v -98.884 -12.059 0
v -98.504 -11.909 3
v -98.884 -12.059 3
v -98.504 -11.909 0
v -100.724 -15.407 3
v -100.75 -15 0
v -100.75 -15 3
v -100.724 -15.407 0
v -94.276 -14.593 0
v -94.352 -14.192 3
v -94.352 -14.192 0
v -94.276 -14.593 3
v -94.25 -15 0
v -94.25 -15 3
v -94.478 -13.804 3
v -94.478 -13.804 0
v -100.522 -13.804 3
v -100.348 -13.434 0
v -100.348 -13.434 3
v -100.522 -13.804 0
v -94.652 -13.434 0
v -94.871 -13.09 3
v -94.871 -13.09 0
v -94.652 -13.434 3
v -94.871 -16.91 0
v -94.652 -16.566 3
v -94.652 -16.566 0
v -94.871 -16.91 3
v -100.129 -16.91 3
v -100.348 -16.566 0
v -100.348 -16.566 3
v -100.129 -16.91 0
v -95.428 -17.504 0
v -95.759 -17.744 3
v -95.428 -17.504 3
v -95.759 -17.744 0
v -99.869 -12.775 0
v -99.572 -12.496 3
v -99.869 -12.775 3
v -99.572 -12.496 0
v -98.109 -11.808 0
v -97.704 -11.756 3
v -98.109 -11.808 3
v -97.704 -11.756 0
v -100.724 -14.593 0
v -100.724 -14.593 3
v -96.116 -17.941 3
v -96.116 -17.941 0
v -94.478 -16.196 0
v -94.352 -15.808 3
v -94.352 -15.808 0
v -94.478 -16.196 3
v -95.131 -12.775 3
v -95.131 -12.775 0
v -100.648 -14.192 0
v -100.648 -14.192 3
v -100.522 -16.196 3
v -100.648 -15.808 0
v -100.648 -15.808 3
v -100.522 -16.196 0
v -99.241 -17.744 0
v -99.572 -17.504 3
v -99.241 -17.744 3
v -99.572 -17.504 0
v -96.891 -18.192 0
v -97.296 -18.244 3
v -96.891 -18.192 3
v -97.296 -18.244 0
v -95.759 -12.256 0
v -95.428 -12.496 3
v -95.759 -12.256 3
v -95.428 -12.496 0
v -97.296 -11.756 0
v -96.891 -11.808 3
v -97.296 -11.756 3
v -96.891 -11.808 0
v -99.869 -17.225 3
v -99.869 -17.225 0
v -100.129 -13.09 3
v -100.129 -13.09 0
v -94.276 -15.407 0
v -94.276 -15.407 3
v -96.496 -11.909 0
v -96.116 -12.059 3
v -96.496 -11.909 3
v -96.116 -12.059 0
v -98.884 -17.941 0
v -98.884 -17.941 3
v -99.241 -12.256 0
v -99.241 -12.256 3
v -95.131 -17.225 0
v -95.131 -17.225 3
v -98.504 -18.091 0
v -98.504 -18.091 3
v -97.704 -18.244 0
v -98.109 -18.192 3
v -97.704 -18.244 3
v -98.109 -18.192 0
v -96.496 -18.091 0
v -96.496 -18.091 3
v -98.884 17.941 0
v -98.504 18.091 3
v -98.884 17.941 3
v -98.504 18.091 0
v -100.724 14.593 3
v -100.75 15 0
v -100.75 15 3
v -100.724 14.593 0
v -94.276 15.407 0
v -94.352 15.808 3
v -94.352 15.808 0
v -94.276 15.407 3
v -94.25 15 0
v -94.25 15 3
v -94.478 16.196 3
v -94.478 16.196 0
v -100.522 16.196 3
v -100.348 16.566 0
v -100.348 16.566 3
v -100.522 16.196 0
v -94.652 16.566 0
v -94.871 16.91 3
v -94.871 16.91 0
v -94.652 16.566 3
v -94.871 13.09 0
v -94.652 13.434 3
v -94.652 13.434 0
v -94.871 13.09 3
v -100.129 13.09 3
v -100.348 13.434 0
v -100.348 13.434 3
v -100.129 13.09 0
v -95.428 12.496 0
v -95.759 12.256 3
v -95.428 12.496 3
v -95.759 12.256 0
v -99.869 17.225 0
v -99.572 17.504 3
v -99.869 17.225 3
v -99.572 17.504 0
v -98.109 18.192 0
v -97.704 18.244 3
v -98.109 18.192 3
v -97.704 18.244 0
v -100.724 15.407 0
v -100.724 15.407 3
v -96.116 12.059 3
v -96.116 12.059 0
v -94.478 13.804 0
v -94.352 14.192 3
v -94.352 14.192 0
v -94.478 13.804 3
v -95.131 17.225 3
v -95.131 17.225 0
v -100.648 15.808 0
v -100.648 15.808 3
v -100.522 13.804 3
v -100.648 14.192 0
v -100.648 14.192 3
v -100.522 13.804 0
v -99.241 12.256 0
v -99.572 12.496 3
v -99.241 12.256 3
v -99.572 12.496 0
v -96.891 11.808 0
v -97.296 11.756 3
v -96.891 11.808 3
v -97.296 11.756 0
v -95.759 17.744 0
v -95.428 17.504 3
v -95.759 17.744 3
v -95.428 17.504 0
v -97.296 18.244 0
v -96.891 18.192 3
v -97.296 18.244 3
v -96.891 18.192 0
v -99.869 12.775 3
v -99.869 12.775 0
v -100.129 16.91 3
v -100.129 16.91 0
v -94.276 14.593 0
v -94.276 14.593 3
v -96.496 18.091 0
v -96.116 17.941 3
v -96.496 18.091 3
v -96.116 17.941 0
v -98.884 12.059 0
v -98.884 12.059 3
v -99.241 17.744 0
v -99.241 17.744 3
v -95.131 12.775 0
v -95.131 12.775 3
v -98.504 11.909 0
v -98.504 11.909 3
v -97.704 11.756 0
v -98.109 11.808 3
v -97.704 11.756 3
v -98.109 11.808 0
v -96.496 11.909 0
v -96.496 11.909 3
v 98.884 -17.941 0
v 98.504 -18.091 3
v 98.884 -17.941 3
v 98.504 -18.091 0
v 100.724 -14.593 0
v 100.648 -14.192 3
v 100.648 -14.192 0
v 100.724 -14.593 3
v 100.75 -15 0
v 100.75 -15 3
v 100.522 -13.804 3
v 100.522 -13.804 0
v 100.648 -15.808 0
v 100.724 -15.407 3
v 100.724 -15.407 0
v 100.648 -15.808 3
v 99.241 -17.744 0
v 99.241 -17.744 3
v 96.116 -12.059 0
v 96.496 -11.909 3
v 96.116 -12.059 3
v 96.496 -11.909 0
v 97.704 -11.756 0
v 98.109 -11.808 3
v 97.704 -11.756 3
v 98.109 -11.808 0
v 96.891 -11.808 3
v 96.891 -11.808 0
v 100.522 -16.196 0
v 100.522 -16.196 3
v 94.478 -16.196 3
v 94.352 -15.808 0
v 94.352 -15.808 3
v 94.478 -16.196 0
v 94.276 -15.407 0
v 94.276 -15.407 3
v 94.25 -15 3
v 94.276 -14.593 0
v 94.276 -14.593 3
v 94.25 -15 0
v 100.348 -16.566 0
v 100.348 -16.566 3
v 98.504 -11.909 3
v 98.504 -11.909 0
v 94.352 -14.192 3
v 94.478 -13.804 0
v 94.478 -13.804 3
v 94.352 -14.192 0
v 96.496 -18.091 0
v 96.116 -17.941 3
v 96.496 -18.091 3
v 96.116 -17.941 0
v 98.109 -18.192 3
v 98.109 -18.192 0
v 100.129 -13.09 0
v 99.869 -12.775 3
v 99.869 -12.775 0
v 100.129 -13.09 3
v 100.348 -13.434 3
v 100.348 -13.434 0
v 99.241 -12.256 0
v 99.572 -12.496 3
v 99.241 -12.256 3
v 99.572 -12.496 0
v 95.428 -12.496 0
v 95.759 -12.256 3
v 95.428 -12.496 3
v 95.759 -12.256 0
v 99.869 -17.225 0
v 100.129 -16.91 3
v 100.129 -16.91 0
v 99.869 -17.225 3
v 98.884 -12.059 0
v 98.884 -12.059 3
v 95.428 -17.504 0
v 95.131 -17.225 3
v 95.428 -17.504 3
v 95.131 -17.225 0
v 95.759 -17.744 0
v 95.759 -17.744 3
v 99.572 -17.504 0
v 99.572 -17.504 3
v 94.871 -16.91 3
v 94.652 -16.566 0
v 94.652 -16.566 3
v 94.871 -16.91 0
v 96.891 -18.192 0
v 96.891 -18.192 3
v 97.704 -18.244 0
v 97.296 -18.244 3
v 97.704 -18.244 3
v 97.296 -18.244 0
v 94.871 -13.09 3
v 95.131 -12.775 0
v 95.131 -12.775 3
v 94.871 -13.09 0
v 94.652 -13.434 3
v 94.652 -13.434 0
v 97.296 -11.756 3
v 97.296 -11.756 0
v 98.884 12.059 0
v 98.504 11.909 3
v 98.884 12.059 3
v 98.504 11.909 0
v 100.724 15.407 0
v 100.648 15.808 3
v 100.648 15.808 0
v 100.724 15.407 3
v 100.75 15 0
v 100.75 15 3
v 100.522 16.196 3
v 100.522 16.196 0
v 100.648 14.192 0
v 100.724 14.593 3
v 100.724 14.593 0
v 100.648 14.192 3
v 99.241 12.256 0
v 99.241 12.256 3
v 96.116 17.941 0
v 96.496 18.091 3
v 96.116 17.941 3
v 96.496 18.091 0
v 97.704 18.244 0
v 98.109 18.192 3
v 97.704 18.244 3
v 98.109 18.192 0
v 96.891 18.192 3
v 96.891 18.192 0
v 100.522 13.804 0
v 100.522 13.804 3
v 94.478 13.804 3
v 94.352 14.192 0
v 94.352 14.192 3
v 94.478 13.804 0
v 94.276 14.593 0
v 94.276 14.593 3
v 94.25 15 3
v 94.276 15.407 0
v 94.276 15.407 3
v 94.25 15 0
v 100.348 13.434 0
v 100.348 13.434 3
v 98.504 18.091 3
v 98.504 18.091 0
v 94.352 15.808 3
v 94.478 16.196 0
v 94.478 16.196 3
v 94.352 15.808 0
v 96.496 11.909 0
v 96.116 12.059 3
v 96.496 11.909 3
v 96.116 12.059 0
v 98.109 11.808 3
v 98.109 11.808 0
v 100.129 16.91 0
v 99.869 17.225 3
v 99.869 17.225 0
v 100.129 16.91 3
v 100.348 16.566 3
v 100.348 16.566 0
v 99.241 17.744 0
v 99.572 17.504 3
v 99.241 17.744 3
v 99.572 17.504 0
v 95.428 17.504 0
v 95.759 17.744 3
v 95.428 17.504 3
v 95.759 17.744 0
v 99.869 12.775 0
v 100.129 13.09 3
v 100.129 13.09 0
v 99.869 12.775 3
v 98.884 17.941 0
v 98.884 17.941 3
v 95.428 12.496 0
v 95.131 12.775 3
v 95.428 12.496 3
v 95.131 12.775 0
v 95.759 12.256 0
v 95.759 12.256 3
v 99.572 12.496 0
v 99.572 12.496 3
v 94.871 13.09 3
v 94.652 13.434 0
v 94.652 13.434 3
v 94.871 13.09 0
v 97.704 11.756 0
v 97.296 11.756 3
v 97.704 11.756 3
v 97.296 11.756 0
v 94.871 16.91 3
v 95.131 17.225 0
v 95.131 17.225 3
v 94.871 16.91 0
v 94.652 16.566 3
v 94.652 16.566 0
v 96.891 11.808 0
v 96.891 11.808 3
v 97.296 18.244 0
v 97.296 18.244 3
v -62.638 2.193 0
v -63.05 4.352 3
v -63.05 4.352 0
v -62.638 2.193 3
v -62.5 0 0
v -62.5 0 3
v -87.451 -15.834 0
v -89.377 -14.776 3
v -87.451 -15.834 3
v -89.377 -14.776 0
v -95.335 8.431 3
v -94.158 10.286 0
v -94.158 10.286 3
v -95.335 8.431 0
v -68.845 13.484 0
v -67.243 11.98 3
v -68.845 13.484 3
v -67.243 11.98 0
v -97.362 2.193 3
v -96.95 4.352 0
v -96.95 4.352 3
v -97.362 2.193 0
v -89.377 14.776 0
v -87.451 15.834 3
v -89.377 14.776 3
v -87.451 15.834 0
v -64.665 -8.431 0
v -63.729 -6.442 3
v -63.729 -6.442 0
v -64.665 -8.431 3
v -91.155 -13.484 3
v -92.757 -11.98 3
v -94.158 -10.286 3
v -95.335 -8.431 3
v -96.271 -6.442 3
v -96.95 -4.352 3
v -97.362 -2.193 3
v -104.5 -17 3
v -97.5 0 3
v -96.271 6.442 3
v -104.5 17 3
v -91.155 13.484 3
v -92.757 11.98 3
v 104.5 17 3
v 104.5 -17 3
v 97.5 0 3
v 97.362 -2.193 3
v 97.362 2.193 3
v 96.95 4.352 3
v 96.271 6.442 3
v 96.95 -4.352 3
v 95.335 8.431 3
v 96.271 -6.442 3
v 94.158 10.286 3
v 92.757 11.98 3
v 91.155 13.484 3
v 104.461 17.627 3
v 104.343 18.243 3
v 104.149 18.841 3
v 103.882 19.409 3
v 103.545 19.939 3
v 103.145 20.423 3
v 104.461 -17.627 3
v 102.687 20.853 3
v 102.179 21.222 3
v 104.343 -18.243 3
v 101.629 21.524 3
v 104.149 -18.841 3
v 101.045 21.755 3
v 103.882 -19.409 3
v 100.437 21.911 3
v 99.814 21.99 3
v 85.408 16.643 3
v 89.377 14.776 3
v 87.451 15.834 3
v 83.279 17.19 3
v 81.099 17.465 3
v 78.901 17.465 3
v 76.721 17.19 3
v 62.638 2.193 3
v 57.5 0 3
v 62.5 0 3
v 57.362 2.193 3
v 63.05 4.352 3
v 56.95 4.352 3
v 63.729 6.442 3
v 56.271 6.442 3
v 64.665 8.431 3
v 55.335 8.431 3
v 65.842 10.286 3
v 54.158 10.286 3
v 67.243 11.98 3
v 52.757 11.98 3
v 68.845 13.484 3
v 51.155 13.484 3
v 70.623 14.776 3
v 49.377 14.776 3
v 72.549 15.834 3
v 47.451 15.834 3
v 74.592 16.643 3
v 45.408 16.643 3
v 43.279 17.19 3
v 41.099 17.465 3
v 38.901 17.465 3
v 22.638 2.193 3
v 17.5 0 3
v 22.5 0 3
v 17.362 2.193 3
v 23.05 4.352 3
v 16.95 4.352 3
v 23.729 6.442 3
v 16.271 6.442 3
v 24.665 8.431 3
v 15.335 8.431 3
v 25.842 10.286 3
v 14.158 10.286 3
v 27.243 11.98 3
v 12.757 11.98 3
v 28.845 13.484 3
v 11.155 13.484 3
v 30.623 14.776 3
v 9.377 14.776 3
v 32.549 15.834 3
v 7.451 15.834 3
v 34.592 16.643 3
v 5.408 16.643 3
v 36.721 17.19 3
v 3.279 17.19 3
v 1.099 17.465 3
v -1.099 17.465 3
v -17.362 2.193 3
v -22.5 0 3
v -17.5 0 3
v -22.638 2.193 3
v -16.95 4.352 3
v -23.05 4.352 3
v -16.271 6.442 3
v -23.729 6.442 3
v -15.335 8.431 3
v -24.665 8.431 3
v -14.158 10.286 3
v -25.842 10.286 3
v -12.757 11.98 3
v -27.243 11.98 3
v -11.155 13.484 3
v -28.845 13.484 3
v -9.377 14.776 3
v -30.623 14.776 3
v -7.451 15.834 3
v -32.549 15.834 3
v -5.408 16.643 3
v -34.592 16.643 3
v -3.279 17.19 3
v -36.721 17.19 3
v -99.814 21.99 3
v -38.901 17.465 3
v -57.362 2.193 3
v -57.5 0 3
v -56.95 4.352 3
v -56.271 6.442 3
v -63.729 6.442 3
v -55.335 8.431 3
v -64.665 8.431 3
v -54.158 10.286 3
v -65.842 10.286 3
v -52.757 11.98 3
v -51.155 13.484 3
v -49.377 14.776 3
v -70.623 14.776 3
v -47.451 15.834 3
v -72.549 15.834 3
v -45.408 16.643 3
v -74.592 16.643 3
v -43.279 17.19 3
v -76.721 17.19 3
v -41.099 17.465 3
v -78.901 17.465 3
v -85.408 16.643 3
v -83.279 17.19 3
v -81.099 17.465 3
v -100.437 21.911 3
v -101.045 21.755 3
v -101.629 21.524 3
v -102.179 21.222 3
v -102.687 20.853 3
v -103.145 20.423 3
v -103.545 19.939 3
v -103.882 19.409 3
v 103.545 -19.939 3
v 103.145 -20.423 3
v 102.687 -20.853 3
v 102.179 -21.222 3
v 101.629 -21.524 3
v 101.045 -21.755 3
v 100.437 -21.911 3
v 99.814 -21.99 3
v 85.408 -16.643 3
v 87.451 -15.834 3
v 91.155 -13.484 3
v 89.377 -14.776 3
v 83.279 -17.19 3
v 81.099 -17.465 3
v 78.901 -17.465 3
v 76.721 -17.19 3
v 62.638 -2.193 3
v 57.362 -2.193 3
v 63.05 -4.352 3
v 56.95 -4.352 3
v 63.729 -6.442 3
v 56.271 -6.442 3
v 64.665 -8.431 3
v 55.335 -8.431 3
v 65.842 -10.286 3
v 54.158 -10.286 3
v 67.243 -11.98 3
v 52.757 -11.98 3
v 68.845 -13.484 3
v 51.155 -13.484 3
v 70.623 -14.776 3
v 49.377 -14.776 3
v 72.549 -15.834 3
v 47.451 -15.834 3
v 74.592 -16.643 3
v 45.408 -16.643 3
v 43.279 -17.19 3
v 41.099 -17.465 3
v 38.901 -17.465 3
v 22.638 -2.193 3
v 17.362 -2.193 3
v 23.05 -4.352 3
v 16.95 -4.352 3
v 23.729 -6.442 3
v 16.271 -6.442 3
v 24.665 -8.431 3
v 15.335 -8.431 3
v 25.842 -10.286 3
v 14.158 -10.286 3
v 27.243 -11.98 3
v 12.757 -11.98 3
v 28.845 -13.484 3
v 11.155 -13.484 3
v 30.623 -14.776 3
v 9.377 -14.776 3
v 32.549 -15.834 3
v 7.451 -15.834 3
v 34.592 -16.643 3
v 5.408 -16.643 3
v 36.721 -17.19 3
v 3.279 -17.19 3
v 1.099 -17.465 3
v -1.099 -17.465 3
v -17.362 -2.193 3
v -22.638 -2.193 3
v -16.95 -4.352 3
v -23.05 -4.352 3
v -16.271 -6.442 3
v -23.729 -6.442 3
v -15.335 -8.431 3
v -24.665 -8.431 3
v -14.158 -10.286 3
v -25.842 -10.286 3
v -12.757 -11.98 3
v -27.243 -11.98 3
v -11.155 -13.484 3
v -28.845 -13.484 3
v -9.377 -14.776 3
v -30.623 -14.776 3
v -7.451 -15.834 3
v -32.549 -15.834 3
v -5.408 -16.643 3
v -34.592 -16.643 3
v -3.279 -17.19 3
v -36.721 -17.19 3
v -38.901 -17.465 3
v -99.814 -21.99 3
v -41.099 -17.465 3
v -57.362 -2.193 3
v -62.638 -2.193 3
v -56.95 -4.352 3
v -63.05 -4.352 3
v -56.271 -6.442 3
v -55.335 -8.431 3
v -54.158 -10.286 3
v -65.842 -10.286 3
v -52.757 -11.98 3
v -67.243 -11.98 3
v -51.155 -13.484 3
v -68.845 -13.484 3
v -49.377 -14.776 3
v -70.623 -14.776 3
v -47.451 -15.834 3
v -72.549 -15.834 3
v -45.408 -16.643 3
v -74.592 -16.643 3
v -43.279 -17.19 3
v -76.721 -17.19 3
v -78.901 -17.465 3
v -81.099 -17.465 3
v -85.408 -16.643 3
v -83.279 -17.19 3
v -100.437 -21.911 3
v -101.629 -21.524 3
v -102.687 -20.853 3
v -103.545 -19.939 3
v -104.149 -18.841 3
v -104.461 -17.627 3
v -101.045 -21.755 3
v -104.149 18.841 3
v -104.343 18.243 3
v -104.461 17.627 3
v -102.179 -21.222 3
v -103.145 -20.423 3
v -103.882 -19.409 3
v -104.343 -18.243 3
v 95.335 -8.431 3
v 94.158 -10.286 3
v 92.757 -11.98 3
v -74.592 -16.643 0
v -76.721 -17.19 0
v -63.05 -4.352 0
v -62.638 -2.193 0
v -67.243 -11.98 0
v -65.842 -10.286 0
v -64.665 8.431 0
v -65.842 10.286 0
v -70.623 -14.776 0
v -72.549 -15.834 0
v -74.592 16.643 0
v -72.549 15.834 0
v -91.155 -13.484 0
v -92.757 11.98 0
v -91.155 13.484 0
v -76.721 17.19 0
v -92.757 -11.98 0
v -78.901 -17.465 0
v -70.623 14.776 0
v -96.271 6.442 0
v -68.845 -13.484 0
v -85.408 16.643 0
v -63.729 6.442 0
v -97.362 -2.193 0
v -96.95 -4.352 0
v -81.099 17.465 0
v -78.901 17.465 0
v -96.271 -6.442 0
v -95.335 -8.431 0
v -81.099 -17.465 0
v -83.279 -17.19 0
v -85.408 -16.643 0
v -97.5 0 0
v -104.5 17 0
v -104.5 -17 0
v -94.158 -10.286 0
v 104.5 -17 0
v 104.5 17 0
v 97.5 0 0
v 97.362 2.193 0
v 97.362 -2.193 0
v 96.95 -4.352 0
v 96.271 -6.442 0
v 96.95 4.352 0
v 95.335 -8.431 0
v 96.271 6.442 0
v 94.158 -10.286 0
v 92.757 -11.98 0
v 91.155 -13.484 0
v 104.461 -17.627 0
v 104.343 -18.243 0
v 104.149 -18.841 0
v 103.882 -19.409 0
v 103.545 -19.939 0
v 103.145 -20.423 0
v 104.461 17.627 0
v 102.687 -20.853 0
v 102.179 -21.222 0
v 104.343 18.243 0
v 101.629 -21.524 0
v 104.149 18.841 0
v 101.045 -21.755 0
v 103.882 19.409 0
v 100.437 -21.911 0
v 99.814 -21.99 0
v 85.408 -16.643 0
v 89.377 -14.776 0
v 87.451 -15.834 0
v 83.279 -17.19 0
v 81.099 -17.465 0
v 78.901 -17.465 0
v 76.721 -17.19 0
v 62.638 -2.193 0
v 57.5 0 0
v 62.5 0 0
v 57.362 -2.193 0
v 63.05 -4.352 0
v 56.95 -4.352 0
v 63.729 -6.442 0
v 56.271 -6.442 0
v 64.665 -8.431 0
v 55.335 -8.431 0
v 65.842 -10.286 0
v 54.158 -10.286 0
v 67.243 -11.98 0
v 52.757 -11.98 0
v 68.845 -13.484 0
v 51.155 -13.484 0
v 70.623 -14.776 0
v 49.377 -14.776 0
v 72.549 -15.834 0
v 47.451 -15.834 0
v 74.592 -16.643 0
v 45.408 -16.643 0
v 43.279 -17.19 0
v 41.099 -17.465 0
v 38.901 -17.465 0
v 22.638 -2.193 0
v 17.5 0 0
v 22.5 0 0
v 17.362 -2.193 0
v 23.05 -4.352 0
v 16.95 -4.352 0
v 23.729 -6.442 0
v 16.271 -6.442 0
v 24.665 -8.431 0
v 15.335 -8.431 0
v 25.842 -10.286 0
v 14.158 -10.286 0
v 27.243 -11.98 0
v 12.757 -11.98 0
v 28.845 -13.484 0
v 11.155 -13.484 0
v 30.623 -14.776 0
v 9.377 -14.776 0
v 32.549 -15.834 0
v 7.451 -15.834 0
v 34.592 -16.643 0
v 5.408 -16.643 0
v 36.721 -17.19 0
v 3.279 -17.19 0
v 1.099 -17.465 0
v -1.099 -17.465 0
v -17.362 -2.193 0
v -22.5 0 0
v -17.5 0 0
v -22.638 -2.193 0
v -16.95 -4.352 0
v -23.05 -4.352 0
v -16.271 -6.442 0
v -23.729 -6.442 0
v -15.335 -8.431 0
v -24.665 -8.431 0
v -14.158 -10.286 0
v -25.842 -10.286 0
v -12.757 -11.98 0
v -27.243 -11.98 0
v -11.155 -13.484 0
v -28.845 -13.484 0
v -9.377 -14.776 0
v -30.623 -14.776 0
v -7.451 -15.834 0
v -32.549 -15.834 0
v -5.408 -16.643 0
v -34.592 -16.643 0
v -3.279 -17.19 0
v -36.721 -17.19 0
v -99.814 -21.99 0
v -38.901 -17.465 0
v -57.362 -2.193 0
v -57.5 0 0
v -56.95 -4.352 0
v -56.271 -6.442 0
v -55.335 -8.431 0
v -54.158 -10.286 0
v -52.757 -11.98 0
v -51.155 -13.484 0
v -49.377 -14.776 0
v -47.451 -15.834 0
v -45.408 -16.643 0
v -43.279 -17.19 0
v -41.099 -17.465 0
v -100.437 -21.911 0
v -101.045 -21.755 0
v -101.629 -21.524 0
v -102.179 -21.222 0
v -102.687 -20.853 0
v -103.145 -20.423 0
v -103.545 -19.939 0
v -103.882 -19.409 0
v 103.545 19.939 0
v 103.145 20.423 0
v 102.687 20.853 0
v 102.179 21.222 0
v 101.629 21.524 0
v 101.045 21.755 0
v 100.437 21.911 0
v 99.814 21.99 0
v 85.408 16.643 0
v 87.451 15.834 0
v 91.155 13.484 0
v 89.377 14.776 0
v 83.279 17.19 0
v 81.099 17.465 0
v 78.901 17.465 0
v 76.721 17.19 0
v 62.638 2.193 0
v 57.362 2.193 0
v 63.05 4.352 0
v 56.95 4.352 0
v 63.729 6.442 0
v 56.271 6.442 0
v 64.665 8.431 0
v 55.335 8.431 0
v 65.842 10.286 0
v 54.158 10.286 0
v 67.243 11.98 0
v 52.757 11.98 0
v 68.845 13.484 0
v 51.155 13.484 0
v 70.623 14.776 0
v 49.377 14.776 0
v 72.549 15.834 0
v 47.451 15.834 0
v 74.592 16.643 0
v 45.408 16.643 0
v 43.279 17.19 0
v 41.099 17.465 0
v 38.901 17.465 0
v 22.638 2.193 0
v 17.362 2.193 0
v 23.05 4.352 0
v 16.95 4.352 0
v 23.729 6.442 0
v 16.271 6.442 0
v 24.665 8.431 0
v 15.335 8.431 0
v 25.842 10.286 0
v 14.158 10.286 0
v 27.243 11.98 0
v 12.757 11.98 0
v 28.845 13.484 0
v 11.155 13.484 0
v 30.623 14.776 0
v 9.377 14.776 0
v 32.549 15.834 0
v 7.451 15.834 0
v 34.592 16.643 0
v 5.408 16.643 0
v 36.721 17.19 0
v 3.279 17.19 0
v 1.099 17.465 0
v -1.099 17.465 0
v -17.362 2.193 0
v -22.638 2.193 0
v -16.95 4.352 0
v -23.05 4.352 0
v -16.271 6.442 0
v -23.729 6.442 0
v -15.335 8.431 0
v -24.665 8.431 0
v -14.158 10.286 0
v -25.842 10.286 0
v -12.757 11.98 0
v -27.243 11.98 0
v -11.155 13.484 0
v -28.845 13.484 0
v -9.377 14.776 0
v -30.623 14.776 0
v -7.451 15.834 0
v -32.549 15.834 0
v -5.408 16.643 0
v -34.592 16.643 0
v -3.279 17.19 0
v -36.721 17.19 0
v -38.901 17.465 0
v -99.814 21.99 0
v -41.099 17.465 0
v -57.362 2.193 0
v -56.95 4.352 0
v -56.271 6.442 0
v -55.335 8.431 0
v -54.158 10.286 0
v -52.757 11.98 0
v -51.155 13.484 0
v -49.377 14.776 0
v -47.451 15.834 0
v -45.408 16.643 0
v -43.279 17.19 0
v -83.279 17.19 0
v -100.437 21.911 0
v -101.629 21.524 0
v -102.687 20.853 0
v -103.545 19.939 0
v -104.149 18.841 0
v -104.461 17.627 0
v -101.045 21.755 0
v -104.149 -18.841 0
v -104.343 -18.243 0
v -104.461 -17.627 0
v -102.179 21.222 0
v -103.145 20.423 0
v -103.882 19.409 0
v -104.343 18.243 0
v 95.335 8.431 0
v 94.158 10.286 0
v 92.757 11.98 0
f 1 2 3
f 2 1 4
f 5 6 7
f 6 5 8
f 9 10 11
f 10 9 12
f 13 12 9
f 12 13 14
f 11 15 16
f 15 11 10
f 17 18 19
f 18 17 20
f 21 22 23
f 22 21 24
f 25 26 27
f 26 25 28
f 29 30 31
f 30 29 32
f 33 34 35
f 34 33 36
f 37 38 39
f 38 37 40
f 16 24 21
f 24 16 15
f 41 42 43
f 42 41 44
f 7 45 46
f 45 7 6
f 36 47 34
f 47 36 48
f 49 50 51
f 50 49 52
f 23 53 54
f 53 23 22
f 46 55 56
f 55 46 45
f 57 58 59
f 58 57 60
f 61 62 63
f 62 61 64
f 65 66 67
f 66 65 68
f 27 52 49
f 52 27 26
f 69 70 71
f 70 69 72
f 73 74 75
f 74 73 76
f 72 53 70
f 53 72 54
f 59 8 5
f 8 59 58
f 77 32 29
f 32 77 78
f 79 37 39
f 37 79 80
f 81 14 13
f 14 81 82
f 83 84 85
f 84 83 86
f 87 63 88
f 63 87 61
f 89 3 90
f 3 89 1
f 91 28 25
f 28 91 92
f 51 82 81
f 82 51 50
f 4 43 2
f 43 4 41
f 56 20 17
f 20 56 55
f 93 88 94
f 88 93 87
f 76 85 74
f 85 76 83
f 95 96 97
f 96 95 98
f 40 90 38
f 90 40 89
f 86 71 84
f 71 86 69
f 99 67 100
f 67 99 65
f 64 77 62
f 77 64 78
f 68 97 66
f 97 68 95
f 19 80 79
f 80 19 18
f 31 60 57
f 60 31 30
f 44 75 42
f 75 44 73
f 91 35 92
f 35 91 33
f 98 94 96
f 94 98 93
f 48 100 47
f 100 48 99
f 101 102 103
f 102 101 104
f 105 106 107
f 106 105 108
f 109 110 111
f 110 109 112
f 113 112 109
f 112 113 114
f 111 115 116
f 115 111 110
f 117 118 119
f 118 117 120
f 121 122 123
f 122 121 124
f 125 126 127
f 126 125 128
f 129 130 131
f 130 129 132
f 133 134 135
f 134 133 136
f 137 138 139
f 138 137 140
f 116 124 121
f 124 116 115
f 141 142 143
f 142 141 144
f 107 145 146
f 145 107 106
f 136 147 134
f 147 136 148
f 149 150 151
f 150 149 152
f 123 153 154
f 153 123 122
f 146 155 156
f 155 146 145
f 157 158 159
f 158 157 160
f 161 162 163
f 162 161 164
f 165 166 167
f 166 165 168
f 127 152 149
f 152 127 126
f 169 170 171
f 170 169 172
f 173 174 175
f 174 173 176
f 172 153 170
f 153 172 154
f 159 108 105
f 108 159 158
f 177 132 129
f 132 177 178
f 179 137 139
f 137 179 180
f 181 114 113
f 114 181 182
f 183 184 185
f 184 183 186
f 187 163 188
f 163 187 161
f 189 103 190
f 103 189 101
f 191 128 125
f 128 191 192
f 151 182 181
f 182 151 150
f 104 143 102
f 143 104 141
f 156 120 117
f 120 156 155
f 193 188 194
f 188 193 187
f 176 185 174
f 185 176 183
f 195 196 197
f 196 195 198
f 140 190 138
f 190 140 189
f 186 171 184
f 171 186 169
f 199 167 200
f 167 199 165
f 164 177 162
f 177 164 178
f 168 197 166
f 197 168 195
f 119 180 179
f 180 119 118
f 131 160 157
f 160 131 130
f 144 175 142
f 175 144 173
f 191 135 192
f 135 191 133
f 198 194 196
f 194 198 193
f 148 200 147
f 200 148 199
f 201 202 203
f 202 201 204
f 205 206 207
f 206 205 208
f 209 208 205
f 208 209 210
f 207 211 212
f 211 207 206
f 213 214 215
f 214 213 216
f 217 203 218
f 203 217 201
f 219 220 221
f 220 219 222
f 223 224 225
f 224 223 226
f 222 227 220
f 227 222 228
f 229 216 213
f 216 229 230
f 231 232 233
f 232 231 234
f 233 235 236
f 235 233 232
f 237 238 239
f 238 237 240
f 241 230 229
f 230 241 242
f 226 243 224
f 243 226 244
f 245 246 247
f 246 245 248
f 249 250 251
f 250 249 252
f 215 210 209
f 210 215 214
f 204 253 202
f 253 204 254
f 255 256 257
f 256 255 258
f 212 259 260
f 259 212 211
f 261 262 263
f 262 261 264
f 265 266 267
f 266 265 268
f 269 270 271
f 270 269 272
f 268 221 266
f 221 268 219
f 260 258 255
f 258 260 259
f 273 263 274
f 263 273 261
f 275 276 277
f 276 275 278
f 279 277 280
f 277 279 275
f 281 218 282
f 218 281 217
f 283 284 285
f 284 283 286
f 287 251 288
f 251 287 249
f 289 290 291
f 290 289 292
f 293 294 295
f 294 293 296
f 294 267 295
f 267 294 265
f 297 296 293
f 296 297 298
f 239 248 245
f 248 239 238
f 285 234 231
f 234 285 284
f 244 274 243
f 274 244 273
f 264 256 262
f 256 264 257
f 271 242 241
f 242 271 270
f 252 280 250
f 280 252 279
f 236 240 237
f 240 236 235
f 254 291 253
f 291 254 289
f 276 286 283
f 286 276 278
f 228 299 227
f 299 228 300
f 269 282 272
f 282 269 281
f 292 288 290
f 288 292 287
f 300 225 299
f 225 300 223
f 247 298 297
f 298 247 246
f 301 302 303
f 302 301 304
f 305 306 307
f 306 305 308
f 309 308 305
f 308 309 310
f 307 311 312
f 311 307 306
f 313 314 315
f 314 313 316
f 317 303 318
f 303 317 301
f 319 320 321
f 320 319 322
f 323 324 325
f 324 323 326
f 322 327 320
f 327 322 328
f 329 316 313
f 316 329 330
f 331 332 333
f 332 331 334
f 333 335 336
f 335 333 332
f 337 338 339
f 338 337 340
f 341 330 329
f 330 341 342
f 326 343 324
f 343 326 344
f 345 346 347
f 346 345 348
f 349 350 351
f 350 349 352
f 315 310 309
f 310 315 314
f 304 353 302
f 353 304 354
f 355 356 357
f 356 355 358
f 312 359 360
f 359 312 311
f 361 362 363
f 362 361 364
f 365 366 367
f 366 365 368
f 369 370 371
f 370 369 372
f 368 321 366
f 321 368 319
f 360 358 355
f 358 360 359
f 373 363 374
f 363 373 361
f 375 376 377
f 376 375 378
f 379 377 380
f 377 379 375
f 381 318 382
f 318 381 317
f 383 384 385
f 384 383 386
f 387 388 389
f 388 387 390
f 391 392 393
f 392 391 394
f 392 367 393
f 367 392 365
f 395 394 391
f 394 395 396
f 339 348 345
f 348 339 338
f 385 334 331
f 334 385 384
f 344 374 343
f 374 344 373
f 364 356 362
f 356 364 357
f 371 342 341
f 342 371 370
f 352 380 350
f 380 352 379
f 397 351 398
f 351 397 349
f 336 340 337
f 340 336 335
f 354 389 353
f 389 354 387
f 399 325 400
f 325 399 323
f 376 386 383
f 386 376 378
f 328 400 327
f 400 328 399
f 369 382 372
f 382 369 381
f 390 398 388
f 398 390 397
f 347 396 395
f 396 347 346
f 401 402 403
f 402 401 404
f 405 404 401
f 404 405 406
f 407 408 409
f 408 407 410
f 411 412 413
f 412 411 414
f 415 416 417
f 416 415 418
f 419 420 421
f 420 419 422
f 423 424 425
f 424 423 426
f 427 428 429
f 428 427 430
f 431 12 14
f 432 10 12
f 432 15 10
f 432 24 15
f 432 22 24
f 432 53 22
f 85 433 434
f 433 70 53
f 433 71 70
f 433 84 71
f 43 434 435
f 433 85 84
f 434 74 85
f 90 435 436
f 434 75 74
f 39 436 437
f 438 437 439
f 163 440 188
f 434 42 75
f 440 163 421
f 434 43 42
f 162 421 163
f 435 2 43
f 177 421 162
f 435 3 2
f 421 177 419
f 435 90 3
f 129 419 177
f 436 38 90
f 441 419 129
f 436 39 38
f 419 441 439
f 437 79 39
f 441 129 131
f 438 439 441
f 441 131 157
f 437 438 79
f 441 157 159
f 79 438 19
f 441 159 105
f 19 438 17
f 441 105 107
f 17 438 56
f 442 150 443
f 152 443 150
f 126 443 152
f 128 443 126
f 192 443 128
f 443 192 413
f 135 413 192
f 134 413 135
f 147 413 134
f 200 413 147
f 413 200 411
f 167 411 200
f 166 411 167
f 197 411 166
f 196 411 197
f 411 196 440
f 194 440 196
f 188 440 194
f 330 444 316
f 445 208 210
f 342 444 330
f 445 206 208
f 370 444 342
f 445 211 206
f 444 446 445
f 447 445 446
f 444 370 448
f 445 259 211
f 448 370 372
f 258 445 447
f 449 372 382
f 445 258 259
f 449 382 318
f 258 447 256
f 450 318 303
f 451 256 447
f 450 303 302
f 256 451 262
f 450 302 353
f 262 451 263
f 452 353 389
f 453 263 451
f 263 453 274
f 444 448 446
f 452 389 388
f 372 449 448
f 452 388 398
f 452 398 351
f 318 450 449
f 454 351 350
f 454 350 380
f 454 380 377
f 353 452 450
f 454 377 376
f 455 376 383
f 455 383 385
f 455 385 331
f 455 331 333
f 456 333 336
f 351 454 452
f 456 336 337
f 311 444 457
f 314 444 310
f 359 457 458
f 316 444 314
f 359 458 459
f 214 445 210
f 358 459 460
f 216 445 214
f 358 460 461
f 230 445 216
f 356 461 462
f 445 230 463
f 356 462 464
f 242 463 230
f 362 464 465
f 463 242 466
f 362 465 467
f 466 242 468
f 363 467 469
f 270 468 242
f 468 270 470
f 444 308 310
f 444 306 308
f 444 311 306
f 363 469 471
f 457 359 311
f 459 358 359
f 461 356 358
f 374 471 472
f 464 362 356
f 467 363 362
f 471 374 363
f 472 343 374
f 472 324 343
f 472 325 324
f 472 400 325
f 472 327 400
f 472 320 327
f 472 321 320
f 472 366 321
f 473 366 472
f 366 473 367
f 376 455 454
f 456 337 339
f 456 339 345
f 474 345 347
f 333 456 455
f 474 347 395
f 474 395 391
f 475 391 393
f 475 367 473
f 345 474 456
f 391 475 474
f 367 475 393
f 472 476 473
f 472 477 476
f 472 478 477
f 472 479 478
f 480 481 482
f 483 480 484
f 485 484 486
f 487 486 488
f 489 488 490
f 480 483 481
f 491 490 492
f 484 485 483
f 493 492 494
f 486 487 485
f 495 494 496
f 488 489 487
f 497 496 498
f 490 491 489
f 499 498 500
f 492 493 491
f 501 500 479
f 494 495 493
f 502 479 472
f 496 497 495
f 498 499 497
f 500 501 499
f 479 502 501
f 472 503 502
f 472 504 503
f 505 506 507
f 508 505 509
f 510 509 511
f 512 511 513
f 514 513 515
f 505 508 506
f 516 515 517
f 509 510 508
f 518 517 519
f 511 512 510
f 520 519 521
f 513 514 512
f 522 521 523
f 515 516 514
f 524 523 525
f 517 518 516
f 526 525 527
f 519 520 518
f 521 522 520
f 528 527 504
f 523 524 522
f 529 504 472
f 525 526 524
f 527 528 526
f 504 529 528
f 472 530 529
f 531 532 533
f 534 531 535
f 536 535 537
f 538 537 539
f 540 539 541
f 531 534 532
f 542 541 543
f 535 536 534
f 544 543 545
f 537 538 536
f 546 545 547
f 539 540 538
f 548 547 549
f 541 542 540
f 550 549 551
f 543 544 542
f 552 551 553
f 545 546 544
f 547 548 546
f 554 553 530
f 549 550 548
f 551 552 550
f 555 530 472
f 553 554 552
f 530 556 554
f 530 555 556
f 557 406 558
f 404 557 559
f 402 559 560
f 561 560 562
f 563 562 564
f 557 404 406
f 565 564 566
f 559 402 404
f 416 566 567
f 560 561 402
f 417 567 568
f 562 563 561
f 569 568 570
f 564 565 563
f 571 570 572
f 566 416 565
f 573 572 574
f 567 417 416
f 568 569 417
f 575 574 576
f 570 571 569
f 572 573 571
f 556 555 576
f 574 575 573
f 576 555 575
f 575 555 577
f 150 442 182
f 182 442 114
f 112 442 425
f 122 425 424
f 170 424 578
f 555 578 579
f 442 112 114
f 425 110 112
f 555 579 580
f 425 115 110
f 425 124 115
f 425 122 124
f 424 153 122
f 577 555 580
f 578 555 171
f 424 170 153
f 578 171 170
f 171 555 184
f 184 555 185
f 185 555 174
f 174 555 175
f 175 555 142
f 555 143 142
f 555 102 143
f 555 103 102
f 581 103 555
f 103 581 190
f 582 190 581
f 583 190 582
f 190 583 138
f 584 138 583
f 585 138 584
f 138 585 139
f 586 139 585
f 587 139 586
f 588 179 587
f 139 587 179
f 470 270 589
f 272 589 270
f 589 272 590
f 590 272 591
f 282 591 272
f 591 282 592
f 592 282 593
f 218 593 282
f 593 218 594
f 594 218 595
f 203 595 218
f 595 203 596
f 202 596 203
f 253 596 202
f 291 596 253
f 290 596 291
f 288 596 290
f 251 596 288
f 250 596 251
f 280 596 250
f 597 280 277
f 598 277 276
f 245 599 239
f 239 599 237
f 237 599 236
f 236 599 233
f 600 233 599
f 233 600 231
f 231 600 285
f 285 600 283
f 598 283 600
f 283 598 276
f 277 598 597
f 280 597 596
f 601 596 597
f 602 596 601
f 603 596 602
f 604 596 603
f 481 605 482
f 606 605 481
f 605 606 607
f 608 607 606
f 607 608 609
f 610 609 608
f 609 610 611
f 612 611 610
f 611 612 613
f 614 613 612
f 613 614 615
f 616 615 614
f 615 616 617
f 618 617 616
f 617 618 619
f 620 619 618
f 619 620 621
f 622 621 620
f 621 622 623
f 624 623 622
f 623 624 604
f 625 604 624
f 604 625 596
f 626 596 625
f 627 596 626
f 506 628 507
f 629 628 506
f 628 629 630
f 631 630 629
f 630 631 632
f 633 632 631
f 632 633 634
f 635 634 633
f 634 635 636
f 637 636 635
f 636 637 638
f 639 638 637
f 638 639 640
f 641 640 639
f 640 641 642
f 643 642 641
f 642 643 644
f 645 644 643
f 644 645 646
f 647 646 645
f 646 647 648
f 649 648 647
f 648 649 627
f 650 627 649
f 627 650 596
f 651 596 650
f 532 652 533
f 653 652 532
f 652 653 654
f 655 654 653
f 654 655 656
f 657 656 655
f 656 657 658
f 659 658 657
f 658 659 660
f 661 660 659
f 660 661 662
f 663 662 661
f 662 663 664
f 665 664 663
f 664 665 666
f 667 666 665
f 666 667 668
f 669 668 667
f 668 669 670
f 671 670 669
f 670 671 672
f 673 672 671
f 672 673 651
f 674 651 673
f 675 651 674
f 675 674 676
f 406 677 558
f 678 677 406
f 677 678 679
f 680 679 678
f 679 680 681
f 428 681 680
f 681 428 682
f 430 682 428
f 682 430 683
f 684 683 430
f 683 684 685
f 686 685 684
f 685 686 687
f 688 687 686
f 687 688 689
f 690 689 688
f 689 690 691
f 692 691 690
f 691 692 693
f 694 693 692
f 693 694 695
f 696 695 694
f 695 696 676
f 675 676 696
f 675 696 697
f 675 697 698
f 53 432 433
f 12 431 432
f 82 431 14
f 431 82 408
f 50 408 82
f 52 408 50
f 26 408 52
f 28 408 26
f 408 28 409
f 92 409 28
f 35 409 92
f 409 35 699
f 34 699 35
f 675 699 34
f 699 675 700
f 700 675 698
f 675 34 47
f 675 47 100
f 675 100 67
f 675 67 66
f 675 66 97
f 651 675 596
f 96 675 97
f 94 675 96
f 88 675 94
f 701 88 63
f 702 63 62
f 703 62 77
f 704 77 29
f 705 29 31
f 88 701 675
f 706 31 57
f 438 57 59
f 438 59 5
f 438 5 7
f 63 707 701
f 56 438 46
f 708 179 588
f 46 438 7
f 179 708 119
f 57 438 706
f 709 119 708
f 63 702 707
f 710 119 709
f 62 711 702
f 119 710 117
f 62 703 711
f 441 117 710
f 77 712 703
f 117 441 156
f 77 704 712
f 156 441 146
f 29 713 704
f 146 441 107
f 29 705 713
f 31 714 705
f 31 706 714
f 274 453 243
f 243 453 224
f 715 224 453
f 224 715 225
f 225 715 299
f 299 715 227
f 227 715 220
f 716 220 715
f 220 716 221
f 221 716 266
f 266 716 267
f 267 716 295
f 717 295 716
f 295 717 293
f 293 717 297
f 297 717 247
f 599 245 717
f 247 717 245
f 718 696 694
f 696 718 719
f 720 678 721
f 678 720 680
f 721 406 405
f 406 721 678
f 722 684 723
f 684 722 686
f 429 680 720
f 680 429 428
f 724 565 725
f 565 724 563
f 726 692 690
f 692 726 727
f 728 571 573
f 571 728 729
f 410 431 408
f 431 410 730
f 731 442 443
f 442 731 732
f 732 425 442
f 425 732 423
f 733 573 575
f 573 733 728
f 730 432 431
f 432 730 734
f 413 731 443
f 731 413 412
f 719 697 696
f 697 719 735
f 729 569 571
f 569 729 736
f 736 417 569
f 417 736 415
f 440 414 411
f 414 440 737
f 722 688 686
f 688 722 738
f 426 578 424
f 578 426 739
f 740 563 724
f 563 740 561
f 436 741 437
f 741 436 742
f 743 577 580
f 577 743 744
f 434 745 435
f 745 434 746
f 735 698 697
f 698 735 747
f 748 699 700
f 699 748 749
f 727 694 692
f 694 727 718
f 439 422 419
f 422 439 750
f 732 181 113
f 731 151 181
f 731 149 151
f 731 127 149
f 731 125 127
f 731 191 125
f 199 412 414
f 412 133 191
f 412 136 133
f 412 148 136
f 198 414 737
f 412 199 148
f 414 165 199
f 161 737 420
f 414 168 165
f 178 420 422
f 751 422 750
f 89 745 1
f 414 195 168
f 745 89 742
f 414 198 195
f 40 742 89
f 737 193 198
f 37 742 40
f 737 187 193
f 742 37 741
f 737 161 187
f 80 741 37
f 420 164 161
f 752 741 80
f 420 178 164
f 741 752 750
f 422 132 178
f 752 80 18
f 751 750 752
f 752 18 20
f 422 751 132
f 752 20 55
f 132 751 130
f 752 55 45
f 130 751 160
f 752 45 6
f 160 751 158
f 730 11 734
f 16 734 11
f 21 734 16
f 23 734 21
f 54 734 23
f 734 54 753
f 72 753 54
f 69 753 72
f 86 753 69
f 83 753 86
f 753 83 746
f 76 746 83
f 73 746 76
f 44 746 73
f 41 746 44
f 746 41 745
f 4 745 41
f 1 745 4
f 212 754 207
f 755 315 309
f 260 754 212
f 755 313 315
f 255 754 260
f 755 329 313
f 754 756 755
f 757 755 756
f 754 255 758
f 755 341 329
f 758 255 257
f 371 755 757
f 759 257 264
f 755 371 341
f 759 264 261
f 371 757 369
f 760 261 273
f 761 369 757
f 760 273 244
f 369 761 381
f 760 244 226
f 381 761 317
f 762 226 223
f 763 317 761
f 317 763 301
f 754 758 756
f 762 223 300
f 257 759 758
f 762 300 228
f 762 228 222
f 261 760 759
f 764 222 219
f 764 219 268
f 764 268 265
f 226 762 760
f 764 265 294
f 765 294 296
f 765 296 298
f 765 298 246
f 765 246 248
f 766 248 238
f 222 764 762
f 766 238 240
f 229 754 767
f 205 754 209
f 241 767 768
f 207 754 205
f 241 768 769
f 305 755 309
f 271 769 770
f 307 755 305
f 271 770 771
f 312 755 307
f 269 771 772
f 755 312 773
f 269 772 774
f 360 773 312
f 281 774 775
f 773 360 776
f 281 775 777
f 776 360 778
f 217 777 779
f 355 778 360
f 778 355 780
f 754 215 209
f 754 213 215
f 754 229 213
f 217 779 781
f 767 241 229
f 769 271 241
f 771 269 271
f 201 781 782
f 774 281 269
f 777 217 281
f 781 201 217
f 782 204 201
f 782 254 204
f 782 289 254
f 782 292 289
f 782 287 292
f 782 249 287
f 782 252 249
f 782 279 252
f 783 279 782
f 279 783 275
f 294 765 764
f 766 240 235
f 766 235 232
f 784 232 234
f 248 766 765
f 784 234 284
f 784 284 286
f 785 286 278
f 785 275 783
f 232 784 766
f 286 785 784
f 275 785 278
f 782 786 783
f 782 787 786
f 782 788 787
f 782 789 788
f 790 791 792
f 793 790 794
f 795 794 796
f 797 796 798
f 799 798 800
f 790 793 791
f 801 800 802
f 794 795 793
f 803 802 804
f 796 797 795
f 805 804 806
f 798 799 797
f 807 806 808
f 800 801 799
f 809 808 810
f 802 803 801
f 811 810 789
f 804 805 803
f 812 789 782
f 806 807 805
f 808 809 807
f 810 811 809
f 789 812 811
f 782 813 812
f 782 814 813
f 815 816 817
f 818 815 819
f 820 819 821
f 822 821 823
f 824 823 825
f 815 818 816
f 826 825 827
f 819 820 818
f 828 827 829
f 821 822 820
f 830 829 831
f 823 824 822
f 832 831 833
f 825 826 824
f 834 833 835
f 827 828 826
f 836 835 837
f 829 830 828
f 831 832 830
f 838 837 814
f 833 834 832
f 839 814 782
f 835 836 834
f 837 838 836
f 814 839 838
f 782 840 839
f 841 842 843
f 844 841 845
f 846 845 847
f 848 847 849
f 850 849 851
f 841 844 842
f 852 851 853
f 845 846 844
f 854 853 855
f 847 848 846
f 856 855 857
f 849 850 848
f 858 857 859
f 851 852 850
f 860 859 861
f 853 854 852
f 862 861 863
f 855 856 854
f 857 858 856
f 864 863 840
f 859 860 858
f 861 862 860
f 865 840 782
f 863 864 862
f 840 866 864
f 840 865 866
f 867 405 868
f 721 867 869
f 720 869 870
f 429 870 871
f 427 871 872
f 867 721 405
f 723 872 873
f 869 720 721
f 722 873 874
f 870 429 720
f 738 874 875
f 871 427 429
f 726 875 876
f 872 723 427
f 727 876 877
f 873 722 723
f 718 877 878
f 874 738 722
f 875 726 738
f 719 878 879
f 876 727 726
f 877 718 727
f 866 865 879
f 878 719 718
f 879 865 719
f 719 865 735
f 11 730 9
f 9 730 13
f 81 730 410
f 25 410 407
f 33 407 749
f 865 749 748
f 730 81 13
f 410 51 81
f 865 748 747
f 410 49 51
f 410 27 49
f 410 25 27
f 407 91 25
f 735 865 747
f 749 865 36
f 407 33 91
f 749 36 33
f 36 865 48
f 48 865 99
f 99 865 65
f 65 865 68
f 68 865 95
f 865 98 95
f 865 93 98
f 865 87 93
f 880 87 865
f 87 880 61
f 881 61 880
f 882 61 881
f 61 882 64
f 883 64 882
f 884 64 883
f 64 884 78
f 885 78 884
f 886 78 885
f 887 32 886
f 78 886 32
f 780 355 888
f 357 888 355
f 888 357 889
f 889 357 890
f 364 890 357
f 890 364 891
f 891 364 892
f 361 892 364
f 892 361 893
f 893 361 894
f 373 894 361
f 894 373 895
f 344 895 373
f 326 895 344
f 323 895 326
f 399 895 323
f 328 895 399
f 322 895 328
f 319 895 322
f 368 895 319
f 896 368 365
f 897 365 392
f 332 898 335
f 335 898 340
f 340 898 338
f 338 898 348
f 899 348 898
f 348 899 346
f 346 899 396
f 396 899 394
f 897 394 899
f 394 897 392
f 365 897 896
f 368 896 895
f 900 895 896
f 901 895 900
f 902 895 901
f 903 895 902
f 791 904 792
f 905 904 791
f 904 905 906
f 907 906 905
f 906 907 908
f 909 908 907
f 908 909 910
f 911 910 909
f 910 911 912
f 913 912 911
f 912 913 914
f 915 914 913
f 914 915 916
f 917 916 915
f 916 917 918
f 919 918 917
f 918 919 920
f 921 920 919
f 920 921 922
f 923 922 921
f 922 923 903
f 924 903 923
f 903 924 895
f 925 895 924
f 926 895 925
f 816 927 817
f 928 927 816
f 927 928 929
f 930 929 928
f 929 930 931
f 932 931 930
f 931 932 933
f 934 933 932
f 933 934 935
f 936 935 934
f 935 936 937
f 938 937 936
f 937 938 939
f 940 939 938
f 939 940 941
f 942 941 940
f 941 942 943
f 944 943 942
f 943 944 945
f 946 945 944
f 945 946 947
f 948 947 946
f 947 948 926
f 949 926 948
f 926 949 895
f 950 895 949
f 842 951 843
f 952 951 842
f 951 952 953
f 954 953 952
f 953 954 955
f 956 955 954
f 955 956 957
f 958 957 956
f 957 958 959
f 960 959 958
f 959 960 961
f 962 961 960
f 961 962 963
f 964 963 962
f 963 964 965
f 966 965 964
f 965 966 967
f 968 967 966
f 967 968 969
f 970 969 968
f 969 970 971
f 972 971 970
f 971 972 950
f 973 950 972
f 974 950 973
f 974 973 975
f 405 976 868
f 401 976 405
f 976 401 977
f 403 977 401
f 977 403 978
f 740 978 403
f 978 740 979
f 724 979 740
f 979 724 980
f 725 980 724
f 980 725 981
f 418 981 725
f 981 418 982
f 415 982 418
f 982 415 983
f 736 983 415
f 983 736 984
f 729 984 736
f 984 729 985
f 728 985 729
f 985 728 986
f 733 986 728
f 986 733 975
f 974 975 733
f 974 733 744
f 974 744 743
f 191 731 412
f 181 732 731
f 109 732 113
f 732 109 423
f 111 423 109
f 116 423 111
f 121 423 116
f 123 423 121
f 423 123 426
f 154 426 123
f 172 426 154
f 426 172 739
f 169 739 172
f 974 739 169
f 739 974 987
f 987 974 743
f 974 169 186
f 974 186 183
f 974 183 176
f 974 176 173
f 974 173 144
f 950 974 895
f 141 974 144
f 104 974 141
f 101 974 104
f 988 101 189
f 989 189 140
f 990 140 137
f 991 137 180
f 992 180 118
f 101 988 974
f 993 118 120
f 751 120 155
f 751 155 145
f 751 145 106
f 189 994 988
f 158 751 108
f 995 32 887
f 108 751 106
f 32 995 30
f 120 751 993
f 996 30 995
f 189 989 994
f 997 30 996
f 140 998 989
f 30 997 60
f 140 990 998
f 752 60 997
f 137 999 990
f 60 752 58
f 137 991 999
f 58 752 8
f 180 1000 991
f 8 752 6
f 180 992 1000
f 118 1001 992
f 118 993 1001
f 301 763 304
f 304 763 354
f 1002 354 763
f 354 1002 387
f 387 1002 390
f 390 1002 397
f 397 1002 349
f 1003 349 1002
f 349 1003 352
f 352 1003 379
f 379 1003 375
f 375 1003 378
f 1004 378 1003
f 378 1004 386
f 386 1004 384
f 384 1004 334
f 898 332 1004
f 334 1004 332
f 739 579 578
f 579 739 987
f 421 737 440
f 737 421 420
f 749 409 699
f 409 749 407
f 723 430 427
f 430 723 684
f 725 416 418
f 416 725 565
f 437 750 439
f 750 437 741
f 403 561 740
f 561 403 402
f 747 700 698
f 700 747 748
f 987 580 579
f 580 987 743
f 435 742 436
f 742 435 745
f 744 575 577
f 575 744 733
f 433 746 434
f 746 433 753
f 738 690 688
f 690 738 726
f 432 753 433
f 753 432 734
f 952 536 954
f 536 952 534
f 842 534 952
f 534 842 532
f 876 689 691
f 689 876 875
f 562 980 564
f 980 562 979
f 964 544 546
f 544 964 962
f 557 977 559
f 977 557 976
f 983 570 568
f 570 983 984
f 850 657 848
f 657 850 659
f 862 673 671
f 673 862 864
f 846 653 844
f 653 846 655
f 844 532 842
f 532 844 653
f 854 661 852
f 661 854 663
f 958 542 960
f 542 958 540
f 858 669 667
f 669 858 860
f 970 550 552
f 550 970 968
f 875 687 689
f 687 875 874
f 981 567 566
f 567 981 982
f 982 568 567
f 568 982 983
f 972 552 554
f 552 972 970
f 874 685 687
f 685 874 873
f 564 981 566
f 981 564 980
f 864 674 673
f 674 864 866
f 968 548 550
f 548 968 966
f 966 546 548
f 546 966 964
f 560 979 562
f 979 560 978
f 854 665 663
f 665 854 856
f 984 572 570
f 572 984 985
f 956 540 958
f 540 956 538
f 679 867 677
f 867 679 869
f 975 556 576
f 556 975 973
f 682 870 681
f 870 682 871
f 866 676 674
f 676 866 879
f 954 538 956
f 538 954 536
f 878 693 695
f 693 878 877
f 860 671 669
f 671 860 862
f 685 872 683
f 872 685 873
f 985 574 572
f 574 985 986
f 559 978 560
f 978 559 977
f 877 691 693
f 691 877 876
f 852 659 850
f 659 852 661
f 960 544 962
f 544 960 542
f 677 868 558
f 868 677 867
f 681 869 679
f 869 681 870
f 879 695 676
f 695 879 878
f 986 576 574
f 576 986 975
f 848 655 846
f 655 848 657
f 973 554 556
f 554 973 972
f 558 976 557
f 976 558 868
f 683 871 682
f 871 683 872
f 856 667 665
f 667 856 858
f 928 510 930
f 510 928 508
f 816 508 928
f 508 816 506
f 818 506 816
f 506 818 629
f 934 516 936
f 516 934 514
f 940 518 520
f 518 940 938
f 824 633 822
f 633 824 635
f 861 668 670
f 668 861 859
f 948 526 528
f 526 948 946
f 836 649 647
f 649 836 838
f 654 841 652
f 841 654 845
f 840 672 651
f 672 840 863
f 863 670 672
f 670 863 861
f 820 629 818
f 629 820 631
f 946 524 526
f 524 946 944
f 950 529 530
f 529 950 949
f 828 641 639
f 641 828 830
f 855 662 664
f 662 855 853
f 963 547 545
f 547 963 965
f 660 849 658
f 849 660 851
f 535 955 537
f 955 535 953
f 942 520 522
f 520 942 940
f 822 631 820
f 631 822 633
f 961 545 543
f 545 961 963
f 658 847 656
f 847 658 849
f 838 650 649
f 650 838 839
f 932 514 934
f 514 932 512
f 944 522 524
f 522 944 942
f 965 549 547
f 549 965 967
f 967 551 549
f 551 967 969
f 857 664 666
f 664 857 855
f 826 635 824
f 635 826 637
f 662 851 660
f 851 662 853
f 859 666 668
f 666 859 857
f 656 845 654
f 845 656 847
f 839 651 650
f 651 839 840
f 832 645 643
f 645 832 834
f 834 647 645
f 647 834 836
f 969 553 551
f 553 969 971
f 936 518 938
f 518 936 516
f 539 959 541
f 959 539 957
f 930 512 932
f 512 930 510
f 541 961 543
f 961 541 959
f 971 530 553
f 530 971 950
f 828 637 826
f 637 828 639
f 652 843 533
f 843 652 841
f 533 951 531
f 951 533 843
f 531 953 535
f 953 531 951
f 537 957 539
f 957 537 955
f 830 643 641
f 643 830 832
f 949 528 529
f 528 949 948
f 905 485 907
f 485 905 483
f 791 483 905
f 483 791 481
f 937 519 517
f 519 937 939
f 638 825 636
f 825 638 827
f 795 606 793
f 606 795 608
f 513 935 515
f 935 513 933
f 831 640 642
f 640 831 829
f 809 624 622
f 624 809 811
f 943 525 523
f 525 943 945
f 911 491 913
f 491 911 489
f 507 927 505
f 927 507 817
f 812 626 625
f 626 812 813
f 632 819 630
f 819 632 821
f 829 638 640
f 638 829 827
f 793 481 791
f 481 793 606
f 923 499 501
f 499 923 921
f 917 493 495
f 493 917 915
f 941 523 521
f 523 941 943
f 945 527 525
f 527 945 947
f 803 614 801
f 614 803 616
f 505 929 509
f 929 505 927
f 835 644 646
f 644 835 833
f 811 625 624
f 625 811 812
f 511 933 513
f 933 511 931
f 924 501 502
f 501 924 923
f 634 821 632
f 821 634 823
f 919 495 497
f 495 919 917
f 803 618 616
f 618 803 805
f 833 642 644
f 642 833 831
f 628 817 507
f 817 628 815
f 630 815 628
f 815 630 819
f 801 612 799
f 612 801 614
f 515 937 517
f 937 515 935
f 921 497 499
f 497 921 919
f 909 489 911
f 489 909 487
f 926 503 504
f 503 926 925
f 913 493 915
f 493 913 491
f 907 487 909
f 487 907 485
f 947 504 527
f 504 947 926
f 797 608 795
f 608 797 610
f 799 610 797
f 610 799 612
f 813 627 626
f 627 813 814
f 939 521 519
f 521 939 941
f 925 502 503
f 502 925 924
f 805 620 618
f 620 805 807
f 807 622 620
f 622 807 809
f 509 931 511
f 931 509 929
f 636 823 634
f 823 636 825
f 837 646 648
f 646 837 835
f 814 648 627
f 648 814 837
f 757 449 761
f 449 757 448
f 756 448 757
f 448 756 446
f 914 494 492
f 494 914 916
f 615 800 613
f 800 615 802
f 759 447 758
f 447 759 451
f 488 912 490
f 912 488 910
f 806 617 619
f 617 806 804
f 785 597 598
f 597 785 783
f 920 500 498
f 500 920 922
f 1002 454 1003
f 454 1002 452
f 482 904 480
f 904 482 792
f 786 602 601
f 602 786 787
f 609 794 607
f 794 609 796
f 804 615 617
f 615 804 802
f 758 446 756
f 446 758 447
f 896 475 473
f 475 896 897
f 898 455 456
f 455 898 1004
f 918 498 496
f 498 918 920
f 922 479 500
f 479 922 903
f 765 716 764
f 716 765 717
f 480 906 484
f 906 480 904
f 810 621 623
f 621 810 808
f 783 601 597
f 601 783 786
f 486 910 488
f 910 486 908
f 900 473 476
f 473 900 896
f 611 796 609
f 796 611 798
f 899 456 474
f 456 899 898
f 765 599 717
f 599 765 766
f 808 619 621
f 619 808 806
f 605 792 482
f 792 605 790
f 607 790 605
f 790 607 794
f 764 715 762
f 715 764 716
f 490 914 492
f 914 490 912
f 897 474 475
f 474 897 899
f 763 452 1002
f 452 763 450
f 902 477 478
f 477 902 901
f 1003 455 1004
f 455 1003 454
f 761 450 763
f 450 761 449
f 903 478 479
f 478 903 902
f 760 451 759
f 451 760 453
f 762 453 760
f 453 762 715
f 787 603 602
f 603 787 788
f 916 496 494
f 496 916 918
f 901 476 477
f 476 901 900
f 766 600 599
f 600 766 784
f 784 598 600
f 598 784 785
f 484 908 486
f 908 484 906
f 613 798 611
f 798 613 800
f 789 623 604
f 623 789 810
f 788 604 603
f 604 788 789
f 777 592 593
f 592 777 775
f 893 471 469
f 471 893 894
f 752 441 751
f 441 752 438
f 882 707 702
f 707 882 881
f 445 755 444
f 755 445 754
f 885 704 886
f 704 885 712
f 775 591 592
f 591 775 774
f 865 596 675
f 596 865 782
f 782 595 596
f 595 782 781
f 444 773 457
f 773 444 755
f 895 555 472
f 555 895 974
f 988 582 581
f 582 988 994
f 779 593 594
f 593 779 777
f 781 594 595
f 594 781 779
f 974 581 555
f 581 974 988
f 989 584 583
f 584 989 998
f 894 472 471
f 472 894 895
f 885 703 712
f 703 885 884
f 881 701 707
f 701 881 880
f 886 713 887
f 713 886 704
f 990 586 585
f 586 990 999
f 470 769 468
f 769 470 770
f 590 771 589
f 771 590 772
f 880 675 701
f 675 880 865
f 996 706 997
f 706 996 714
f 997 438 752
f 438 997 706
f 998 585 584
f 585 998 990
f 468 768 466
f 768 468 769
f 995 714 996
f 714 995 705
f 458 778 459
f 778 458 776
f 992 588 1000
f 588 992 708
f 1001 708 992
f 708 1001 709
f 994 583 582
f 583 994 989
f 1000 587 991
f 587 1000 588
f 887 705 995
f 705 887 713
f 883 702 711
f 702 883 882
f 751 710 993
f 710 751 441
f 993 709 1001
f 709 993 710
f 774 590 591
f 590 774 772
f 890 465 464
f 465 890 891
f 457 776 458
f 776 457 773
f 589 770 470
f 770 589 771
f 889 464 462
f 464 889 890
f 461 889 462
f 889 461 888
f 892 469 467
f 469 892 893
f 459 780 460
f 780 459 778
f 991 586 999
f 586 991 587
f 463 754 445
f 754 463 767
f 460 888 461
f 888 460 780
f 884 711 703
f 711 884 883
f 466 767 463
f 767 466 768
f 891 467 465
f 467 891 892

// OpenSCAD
$fn = 50;


difference() {
	union() {
		hull() {
			translate(v = [-99.5000000000, 17.0000000000, 0]) {
				cylinder(h = 3, r = 5);
			}
			translate(v = [99.5000000000, 17.0000000000, 0]) {
				cylinder(h = 3, r = 5);
			}
			translate(v = [-99.5000000000, -17.0000000000, 0]) {
				cylinder(h = 3, r = 5);
			}
			translate(v = [99.5000000000, -17.0000000000, 0]) {
				cylinder(h = 3, r = 5);
			}
		}
	}
	union() {
		#translate(v = [-97.5000000000, -15.0000000000, -100.0000000000]) {
			cylinder(h = 200, r = 3.2500000000);
		}
		#translate(v = [-97.5000000000, 15.0000000000, -100.0000000000]) {
			cylinder(h = 200, r = 3.2500000000);
		}
		#translate(v = [97.5000000000, -15.0000000000, -100.0000000000]) {
			cylinder(h = 200, r = 3.2500000000);
		}
		#translate(v = [97.5000000000, 15.0000000000, -100.0000000000]) {
			cylinder(h = 200, r = 3.2500000000);
		}
		#translate(v = [-80.0000000000, 0, 0]) {
			cylinder(h = 3, r = 17.5000000000);
		}
		#translate(v = [-40.0000000000, 0, 0]) {
			cylinder(h = 3, r = 17.5000000000);
		}
		#cylinder(h = 3, r = 17.5000000000);
		#translate(v = [40.0000000000, 0, 0]) {
			cylinder(h = 3, r = 17.5000000000);
		}
		#translate(v = [80.0000000000, 0, 0]) {
			cylinder(h = 3, r = 17.5000000000);
		}
	}
}
